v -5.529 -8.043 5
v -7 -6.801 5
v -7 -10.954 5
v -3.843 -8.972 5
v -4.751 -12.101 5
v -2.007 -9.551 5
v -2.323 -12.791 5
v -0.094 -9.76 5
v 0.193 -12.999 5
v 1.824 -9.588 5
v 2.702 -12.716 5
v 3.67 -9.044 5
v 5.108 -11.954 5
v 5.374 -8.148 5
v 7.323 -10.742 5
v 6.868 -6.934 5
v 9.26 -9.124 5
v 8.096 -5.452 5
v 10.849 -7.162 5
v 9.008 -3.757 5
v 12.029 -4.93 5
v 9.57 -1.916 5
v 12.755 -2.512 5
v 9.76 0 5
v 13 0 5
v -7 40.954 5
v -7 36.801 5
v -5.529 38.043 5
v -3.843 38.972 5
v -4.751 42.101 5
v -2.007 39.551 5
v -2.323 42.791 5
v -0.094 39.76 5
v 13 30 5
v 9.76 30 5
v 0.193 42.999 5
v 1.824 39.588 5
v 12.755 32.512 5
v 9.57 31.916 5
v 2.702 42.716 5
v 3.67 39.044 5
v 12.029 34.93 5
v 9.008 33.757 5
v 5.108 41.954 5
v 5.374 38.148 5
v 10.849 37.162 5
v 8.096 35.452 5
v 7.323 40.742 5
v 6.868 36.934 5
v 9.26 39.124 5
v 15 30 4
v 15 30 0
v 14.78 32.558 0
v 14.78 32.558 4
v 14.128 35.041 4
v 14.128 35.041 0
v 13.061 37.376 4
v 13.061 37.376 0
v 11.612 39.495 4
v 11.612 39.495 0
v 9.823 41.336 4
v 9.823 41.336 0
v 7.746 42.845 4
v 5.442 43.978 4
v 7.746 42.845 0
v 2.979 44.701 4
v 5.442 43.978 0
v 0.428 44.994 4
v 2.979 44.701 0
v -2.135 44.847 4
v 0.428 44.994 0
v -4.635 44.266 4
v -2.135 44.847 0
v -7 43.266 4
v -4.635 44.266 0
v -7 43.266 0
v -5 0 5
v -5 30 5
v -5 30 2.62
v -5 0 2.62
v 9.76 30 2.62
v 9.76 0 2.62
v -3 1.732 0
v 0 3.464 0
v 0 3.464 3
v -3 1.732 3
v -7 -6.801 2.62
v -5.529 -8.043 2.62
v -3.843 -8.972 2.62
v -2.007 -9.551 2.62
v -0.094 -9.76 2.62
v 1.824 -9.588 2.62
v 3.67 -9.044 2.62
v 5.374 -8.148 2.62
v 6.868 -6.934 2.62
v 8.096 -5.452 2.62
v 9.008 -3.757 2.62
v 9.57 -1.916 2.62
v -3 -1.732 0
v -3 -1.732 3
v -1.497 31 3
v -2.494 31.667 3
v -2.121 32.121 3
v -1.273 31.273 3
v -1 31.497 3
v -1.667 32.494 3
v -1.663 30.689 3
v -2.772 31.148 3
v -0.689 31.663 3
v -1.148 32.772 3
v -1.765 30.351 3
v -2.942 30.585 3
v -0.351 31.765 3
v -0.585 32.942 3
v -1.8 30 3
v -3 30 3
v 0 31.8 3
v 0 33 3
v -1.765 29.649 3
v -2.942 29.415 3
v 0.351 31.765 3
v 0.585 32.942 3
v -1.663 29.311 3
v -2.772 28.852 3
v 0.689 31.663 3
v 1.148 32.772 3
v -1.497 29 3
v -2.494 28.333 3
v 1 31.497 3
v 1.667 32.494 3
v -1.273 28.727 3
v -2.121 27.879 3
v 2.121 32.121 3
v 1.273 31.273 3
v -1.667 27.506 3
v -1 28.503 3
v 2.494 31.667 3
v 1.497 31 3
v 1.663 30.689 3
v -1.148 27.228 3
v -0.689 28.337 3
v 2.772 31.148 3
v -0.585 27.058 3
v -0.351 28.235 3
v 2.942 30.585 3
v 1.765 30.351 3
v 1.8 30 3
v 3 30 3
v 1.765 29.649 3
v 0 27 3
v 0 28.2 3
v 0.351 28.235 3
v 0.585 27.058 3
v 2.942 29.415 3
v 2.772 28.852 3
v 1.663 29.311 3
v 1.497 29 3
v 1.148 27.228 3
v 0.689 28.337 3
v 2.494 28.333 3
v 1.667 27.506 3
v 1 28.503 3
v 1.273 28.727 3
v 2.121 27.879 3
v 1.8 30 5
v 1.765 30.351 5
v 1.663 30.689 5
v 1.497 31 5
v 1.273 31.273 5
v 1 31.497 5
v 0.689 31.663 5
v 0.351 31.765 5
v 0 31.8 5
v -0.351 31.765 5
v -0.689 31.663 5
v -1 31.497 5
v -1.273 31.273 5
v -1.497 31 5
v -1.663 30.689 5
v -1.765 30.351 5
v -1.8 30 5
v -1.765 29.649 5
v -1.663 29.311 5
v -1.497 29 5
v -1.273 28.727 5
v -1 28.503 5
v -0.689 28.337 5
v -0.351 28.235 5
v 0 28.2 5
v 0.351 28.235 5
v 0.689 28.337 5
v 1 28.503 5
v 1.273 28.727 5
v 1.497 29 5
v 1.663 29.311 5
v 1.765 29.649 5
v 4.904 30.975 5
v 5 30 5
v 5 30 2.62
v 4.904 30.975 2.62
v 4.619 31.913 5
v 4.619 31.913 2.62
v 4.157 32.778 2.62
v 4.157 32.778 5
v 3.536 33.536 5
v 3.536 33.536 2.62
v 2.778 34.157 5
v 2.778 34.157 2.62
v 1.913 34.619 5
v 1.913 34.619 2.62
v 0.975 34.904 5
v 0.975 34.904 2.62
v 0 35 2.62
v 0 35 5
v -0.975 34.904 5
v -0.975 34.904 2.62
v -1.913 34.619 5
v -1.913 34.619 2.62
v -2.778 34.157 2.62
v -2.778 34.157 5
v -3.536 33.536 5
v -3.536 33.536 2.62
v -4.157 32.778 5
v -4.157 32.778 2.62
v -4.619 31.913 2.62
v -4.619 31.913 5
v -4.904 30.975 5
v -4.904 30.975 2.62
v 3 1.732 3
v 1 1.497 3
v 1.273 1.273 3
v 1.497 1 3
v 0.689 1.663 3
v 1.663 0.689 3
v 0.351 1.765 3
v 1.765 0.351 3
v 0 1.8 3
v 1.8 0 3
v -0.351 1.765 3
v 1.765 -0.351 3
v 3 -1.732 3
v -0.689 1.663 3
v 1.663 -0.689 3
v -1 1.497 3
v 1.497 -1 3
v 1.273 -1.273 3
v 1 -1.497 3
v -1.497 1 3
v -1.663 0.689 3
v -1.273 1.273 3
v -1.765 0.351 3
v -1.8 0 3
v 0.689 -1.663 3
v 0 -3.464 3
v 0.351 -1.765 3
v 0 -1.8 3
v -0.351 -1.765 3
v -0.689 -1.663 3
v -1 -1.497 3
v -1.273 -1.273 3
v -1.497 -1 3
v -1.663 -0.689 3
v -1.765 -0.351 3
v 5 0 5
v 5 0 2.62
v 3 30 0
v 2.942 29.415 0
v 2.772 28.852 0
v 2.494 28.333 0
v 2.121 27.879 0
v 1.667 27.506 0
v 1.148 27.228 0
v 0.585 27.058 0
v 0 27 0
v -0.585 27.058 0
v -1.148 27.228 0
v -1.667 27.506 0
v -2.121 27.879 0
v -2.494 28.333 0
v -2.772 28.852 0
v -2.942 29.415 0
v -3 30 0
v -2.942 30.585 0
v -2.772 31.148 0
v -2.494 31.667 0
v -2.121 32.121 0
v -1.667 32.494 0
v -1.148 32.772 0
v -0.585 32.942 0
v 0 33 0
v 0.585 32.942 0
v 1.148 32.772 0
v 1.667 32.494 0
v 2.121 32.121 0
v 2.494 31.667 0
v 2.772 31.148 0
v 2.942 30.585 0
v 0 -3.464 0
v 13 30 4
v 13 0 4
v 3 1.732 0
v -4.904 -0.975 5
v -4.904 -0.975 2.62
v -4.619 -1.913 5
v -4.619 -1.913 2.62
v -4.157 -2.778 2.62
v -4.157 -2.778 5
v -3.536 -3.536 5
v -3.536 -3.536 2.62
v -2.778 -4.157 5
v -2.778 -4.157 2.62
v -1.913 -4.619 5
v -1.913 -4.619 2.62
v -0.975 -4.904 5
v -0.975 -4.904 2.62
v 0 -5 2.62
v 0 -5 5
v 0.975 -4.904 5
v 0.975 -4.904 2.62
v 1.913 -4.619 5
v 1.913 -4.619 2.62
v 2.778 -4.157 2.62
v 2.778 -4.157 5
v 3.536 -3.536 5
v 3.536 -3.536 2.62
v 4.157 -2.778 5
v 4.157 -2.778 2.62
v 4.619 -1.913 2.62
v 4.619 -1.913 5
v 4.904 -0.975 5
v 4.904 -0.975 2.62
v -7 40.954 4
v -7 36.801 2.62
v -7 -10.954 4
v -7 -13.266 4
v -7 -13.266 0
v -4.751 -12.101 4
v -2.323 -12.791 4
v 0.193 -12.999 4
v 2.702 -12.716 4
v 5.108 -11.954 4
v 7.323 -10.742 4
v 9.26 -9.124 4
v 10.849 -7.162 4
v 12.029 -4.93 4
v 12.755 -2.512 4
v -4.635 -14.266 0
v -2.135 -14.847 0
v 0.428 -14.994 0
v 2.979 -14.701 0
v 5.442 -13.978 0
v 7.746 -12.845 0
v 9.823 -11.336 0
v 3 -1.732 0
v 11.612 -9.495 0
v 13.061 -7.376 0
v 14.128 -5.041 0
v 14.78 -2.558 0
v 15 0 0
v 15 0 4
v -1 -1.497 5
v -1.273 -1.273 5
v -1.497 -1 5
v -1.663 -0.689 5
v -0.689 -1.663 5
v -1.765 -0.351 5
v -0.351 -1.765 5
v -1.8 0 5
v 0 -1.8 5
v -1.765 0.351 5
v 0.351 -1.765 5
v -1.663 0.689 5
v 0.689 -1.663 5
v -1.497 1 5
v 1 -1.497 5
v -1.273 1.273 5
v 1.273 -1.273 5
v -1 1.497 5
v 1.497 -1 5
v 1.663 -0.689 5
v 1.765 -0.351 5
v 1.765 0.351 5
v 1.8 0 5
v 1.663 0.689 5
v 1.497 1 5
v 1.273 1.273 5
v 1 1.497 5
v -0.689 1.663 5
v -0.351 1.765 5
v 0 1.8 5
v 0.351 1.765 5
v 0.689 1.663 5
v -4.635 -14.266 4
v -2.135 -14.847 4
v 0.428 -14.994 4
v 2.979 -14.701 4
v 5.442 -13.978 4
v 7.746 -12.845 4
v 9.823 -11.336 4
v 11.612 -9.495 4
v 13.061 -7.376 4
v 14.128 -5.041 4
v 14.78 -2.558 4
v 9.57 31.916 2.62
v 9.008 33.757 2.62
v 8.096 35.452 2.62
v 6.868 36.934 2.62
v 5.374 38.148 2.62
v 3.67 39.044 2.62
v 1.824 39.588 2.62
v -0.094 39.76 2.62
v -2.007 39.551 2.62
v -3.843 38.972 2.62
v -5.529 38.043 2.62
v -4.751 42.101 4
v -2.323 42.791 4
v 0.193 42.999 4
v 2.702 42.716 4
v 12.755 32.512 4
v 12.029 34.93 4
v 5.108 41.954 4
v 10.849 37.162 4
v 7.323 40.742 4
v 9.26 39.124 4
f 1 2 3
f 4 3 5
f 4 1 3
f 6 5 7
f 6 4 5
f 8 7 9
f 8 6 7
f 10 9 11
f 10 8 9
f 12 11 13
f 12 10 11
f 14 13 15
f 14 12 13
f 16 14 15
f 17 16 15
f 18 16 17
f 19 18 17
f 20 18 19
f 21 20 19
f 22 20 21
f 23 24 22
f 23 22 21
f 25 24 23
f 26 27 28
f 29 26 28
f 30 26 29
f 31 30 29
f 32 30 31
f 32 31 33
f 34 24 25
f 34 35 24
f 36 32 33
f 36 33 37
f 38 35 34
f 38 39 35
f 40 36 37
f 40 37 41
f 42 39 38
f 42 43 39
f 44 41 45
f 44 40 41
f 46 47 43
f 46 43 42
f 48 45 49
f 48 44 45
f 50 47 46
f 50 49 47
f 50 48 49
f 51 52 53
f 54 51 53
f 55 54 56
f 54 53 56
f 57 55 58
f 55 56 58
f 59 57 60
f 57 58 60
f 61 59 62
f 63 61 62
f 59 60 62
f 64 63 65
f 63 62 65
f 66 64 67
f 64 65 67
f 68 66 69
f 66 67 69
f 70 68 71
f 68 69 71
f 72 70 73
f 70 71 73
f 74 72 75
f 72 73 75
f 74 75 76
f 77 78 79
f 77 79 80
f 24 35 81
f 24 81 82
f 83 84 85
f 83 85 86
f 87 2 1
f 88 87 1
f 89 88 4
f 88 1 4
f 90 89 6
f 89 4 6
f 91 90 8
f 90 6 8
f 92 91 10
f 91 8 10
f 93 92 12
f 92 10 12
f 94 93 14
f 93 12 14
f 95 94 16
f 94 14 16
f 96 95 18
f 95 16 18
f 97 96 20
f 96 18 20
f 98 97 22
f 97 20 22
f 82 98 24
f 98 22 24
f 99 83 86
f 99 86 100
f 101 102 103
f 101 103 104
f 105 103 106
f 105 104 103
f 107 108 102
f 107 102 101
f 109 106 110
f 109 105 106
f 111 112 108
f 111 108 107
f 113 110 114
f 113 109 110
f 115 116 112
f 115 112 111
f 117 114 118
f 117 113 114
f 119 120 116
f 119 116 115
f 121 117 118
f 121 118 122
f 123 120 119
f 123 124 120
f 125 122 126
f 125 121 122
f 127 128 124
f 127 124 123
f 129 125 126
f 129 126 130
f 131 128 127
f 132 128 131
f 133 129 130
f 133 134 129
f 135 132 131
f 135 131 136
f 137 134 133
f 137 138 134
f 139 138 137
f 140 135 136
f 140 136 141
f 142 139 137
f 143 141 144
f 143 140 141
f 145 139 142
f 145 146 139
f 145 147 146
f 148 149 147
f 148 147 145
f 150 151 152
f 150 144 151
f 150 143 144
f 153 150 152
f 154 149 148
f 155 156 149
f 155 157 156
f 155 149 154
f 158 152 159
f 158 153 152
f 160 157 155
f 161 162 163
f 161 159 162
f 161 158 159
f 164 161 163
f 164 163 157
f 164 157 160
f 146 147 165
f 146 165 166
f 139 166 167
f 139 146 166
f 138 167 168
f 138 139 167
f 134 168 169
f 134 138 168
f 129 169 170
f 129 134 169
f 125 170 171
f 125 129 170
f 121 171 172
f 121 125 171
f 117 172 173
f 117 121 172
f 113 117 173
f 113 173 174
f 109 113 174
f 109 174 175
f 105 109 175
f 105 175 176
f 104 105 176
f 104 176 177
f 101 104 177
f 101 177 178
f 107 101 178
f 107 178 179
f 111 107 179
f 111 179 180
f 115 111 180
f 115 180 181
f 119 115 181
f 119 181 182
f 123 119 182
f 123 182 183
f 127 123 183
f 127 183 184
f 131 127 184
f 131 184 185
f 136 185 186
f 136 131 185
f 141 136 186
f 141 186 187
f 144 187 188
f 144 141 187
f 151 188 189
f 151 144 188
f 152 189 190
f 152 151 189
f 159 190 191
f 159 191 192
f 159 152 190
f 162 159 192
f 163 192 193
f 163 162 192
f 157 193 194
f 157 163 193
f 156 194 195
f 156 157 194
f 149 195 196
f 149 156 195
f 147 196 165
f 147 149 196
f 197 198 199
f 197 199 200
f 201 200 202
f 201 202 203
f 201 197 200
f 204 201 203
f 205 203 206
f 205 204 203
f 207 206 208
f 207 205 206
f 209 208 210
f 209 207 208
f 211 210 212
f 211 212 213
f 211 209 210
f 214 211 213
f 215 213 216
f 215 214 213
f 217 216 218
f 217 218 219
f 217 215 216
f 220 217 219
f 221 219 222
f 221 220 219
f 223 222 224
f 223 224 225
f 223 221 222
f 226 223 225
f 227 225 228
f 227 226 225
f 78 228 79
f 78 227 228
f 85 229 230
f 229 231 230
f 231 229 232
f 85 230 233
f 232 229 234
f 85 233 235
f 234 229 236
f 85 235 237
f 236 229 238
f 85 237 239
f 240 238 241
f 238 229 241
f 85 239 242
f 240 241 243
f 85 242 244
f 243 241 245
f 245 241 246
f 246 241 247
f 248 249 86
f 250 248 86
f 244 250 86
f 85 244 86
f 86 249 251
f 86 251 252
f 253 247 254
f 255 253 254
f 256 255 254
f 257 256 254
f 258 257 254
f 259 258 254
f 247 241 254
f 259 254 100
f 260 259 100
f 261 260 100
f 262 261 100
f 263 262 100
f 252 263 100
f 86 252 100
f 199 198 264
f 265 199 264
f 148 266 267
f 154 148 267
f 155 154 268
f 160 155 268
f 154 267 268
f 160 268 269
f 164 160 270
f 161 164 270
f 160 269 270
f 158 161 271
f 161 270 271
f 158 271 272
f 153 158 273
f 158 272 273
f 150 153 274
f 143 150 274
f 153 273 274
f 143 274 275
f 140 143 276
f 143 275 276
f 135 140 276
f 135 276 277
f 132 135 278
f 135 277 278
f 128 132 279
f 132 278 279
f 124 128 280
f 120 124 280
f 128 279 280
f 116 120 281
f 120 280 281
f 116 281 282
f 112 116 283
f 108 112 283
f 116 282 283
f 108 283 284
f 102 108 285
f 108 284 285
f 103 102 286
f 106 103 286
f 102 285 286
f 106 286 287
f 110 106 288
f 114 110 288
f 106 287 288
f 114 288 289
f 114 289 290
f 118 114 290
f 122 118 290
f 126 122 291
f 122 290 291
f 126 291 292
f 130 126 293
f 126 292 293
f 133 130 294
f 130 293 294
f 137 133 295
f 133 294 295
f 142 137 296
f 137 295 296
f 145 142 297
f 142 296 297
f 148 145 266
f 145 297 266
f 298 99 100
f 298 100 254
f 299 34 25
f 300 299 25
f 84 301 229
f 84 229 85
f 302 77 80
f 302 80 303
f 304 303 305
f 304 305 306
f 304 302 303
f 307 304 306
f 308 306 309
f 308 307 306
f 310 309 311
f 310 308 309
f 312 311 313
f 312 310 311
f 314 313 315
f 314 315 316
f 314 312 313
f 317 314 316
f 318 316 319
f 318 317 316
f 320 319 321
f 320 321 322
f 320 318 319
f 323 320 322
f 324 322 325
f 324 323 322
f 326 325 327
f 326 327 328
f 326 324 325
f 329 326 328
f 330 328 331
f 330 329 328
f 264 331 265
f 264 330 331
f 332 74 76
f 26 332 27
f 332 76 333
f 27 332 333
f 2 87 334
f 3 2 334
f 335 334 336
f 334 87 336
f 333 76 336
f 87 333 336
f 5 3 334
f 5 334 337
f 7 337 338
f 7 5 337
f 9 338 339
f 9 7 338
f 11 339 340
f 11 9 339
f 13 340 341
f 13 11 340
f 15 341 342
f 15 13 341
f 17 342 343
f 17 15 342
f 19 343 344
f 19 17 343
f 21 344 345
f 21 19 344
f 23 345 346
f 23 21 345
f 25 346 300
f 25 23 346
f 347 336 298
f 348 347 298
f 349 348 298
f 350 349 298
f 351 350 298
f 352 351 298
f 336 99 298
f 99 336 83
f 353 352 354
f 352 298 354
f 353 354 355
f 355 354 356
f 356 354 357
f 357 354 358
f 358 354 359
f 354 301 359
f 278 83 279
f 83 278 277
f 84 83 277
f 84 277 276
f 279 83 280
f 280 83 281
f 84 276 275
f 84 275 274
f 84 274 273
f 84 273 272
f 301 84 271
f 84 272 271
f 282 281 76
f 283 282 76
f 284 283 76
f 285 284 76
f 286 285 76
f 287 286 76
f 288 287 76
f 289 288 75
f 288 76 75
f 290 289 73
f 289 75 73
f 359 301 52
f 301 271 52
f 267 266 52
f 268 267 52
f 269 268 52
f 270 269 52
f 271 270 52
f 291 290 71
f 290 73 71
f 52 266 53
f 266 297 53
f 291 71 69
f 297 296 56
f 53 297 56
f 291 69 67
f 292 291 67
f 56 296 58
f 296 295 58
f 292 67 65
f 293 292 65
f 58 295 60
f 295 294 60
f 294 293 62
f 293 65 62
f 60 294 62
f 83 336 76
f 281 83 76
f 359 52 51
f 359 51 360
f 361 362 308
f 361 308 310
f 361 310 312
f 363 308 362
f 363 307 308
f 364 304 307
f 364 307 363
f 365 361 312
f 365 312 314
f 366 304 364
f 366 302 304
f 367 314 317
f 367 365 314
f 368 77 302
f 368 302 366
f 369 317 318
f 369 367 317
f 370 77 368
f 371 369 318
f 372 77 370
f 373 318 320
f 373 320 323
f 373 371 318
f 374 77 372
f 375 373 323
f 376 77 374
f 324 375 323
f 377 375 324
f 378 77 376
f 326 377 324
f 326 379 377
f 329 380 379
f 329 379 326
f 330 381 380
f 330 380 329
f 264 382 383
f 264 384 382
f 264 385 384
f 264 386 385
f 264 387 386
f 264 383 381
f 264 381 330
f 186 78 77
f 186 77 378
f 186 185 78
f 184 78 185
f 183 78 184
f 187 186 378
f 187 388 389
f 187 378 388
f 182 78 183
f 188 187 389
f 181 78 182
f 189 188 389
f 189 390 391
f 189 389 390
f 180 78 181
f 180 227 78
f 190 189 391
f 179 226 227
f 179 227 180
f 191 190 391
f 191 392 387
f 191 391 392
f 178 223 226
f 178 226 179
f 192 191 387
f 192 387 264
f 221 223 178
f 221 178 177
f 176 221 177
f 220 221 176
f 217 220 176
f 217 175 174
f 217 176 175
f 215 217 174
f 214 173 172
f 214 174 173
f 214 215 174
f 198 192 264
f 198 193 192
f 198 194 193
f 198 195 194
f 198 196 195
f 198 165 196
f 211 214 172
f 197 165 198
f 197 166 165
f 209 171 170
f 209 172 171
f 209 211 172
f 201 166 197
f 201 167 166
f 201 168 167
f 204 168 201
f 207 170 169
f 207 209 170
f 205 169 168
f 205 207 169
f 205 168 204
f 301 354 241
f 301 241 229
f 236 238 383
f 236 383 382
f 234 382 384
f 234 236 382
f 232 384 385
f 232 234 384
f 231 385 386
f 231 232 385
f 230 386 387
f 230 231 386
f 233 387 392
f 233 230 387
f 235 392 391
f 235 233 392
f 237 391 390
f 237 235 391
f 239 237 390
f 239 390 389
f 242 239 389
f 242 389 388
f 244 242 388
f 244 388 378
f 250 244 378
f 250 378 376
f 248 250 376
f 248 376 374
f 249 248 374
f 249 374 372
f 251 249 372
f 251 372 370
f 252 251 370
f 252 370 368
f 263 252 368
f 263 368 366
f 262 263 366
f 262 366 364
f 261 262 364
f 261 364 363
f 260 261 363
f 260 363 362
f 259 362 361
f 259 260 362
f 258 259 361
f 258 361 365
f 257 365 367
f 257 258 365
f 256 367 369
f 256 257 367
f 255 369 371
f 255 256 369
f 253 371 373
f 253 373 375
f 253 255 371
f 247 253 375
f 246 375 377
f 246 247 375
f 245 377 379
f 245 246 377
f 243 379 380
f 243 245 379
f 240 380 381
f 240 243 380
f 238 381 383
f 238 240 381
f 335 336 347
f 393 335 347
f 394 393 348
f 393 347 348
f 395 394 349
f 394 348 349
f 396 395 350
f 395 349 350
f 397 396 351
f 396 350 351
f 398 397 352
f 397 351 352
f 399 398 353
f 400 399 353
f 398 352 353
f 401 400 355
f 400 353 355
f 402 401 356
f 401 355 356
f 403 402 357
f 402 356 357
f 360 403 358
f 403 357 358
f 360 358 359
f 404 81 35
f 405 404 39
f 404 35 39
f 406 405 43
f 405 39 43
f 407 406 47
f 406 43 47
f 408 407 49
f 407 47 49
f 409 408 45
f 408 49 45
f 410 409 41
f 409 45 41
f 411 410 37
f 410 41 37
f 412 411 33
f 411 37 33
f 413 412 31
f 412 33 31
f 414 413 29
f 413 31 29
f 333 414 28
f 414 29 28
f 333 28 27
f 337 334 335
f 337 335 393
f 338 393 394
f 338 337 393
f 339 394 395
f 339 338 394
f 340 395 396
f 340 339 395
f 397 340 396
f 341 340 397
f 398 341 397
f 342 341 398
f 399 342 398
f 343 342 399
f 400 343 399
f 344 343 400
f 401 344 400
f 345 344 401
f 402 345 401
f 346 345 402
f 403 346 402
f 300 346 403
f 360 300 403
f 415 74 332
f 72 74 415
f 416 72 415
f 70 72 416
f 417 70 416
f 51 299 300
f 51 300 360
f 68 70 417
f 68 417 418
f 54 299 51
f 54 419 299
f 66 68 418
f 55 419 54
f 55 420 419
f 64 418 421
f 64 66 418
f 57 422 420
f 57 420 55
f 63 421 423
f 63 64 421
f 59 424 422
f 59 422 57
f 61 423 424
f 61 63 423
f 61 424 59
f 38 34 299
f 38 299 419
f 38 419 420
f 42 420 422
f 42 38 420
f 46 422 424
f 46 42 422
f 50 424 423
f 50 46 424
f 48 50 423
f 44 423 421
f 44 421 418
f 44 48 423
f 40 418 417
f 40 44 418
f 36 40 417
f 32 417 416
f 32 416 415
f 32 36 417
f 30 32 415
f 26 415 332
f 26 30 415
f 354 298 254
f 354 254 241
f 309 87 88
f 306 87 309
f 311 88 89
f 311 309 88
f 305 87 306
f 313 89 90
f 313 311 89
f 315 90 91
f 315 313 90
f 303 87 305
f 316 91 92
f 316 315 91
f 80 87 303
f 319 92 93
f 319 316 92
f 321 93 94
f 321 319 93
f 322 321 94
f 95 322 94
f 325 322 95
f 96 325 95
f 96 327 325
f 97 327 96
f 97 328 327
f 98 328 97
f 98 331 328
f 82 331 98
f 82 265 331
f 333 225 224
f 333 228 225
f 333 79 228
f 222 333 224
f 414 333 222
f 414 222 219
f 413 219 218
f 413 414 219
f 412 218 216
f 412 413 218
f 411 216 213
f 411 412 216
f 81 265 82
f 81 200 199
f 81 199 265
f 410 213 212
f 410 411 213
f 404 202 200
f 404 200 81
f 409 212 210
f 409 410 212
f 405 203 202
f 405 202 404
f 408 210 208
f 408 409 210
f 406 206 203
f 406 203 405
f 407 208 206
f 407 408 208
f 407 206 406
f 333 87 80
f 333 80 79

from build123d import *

# Parameters (mm, degrees)
SKETCH_R        = 1.8
PAD_DEPTH       = 5
POCKET_DEPTH    = 2.3800001144
POCKET001_DEPTH = 1
SKETCH003_R     = 3
POCKET002_DEPTH = 3


with BuildPart() as part:
    # Sketch → Pad (new body)
    with BuildSketch(Plane.XY):
        with BuildLine():
            ThreePointArc((-7, -13.2664991614), (7.7459666924, -12.8452325787), (15, 0))
            Line((15, 30), (15, 0))
            ThreePointArc((15, 30), (7.7459666924, 42.8452325787), (-7, 43.2664991614))
            Line((-7, 43.2664991614), (-7, -13.2664991614))
        make_face()
        with Locations((0, 30)):
            Circle(SKETCH_R, mode=Mode.SUBTRACT)
        Circle(SKETCH_R, mode=Mode.SUBTRACT)
    extrude(amount=PAD_DEPTH)

    # Sketch001 → Pocket (cut)
    with BuildSketch(Plane.XY.offset(5)):
        with BuildLine():
            ThreePointArc((9.76, 30), (0, 39.76), (-9.76, 30))
            Line((-9.76, 30), (-9.76, 2.54016e-05))
            ThreePointArc((-9.76, 2.54016e-05), (-1.27008e-05, -9.76), (9.76, 0))
            Line((9.76, 30), (9.76, 0))
        make_face()
        with BuildLine():
            ThreePointArc((5, 30), (0, 35), (-5, 30))
            Line((-5, 30), (-5, 0))
            ThreePointArc((-5, 0), (0, -5), (5, 0))
            Line((5, 30), (5, 0))
        make_face(mode=Mode.SUBTRACT)
    extrude(amount=-POCKET_DEPTH, mode=Mode.SUBTRACT)

    # Sketch002 → Pocket001 (cut)
    with BuildSketch(Plane.XY.offset(5)):
        with BuildLine():
            ThreePointArc((15, 30), (0, 45), (-15, 30))
            Line((-15, 30), (-15, 3.614e-07))
            ThreePointArc((-15, 3.614e-07), (-1.807e-07, -15), (15, 0))
            Line((15, 30), (15, 0))
        make_face()
        with BuildLine():
            ThreePointArc((13, 30), (0, 43), (-13, 30))
            Line((-13, 30), (-13, 3.614e-07))
            ThreePointArc((-13, 3.614e-07), (-1.807e-07, -13), (13, 0))
            Line((13, 30), (13, 0))
        make_face(mode=Mode.SUBTRACT)
    extrude(amount=-POCKET001_DEPTH, mode=Mode.SUBTRACT)

    # Sketch003 → Pocket002 (cut)
    with BuildSketch(Plane(origin=(0, 0, 0), x_dir=(1, 0, 0), z_dir=(0, 0, -1))):
        with Locations((0, -30)):
            Circle(SKETCH003_R)
        Polygon((-3, -1.7320508076), (-3, 1.7320508076), (0, 3.4641016151), (3, 1.7320508076), (3, -1.7320508076), (0, -3.4641016151), align=None)
    extrude(amount=-POCKET002_DEPTH, mode=Mode.SUBTRACT)


solid = part.part
